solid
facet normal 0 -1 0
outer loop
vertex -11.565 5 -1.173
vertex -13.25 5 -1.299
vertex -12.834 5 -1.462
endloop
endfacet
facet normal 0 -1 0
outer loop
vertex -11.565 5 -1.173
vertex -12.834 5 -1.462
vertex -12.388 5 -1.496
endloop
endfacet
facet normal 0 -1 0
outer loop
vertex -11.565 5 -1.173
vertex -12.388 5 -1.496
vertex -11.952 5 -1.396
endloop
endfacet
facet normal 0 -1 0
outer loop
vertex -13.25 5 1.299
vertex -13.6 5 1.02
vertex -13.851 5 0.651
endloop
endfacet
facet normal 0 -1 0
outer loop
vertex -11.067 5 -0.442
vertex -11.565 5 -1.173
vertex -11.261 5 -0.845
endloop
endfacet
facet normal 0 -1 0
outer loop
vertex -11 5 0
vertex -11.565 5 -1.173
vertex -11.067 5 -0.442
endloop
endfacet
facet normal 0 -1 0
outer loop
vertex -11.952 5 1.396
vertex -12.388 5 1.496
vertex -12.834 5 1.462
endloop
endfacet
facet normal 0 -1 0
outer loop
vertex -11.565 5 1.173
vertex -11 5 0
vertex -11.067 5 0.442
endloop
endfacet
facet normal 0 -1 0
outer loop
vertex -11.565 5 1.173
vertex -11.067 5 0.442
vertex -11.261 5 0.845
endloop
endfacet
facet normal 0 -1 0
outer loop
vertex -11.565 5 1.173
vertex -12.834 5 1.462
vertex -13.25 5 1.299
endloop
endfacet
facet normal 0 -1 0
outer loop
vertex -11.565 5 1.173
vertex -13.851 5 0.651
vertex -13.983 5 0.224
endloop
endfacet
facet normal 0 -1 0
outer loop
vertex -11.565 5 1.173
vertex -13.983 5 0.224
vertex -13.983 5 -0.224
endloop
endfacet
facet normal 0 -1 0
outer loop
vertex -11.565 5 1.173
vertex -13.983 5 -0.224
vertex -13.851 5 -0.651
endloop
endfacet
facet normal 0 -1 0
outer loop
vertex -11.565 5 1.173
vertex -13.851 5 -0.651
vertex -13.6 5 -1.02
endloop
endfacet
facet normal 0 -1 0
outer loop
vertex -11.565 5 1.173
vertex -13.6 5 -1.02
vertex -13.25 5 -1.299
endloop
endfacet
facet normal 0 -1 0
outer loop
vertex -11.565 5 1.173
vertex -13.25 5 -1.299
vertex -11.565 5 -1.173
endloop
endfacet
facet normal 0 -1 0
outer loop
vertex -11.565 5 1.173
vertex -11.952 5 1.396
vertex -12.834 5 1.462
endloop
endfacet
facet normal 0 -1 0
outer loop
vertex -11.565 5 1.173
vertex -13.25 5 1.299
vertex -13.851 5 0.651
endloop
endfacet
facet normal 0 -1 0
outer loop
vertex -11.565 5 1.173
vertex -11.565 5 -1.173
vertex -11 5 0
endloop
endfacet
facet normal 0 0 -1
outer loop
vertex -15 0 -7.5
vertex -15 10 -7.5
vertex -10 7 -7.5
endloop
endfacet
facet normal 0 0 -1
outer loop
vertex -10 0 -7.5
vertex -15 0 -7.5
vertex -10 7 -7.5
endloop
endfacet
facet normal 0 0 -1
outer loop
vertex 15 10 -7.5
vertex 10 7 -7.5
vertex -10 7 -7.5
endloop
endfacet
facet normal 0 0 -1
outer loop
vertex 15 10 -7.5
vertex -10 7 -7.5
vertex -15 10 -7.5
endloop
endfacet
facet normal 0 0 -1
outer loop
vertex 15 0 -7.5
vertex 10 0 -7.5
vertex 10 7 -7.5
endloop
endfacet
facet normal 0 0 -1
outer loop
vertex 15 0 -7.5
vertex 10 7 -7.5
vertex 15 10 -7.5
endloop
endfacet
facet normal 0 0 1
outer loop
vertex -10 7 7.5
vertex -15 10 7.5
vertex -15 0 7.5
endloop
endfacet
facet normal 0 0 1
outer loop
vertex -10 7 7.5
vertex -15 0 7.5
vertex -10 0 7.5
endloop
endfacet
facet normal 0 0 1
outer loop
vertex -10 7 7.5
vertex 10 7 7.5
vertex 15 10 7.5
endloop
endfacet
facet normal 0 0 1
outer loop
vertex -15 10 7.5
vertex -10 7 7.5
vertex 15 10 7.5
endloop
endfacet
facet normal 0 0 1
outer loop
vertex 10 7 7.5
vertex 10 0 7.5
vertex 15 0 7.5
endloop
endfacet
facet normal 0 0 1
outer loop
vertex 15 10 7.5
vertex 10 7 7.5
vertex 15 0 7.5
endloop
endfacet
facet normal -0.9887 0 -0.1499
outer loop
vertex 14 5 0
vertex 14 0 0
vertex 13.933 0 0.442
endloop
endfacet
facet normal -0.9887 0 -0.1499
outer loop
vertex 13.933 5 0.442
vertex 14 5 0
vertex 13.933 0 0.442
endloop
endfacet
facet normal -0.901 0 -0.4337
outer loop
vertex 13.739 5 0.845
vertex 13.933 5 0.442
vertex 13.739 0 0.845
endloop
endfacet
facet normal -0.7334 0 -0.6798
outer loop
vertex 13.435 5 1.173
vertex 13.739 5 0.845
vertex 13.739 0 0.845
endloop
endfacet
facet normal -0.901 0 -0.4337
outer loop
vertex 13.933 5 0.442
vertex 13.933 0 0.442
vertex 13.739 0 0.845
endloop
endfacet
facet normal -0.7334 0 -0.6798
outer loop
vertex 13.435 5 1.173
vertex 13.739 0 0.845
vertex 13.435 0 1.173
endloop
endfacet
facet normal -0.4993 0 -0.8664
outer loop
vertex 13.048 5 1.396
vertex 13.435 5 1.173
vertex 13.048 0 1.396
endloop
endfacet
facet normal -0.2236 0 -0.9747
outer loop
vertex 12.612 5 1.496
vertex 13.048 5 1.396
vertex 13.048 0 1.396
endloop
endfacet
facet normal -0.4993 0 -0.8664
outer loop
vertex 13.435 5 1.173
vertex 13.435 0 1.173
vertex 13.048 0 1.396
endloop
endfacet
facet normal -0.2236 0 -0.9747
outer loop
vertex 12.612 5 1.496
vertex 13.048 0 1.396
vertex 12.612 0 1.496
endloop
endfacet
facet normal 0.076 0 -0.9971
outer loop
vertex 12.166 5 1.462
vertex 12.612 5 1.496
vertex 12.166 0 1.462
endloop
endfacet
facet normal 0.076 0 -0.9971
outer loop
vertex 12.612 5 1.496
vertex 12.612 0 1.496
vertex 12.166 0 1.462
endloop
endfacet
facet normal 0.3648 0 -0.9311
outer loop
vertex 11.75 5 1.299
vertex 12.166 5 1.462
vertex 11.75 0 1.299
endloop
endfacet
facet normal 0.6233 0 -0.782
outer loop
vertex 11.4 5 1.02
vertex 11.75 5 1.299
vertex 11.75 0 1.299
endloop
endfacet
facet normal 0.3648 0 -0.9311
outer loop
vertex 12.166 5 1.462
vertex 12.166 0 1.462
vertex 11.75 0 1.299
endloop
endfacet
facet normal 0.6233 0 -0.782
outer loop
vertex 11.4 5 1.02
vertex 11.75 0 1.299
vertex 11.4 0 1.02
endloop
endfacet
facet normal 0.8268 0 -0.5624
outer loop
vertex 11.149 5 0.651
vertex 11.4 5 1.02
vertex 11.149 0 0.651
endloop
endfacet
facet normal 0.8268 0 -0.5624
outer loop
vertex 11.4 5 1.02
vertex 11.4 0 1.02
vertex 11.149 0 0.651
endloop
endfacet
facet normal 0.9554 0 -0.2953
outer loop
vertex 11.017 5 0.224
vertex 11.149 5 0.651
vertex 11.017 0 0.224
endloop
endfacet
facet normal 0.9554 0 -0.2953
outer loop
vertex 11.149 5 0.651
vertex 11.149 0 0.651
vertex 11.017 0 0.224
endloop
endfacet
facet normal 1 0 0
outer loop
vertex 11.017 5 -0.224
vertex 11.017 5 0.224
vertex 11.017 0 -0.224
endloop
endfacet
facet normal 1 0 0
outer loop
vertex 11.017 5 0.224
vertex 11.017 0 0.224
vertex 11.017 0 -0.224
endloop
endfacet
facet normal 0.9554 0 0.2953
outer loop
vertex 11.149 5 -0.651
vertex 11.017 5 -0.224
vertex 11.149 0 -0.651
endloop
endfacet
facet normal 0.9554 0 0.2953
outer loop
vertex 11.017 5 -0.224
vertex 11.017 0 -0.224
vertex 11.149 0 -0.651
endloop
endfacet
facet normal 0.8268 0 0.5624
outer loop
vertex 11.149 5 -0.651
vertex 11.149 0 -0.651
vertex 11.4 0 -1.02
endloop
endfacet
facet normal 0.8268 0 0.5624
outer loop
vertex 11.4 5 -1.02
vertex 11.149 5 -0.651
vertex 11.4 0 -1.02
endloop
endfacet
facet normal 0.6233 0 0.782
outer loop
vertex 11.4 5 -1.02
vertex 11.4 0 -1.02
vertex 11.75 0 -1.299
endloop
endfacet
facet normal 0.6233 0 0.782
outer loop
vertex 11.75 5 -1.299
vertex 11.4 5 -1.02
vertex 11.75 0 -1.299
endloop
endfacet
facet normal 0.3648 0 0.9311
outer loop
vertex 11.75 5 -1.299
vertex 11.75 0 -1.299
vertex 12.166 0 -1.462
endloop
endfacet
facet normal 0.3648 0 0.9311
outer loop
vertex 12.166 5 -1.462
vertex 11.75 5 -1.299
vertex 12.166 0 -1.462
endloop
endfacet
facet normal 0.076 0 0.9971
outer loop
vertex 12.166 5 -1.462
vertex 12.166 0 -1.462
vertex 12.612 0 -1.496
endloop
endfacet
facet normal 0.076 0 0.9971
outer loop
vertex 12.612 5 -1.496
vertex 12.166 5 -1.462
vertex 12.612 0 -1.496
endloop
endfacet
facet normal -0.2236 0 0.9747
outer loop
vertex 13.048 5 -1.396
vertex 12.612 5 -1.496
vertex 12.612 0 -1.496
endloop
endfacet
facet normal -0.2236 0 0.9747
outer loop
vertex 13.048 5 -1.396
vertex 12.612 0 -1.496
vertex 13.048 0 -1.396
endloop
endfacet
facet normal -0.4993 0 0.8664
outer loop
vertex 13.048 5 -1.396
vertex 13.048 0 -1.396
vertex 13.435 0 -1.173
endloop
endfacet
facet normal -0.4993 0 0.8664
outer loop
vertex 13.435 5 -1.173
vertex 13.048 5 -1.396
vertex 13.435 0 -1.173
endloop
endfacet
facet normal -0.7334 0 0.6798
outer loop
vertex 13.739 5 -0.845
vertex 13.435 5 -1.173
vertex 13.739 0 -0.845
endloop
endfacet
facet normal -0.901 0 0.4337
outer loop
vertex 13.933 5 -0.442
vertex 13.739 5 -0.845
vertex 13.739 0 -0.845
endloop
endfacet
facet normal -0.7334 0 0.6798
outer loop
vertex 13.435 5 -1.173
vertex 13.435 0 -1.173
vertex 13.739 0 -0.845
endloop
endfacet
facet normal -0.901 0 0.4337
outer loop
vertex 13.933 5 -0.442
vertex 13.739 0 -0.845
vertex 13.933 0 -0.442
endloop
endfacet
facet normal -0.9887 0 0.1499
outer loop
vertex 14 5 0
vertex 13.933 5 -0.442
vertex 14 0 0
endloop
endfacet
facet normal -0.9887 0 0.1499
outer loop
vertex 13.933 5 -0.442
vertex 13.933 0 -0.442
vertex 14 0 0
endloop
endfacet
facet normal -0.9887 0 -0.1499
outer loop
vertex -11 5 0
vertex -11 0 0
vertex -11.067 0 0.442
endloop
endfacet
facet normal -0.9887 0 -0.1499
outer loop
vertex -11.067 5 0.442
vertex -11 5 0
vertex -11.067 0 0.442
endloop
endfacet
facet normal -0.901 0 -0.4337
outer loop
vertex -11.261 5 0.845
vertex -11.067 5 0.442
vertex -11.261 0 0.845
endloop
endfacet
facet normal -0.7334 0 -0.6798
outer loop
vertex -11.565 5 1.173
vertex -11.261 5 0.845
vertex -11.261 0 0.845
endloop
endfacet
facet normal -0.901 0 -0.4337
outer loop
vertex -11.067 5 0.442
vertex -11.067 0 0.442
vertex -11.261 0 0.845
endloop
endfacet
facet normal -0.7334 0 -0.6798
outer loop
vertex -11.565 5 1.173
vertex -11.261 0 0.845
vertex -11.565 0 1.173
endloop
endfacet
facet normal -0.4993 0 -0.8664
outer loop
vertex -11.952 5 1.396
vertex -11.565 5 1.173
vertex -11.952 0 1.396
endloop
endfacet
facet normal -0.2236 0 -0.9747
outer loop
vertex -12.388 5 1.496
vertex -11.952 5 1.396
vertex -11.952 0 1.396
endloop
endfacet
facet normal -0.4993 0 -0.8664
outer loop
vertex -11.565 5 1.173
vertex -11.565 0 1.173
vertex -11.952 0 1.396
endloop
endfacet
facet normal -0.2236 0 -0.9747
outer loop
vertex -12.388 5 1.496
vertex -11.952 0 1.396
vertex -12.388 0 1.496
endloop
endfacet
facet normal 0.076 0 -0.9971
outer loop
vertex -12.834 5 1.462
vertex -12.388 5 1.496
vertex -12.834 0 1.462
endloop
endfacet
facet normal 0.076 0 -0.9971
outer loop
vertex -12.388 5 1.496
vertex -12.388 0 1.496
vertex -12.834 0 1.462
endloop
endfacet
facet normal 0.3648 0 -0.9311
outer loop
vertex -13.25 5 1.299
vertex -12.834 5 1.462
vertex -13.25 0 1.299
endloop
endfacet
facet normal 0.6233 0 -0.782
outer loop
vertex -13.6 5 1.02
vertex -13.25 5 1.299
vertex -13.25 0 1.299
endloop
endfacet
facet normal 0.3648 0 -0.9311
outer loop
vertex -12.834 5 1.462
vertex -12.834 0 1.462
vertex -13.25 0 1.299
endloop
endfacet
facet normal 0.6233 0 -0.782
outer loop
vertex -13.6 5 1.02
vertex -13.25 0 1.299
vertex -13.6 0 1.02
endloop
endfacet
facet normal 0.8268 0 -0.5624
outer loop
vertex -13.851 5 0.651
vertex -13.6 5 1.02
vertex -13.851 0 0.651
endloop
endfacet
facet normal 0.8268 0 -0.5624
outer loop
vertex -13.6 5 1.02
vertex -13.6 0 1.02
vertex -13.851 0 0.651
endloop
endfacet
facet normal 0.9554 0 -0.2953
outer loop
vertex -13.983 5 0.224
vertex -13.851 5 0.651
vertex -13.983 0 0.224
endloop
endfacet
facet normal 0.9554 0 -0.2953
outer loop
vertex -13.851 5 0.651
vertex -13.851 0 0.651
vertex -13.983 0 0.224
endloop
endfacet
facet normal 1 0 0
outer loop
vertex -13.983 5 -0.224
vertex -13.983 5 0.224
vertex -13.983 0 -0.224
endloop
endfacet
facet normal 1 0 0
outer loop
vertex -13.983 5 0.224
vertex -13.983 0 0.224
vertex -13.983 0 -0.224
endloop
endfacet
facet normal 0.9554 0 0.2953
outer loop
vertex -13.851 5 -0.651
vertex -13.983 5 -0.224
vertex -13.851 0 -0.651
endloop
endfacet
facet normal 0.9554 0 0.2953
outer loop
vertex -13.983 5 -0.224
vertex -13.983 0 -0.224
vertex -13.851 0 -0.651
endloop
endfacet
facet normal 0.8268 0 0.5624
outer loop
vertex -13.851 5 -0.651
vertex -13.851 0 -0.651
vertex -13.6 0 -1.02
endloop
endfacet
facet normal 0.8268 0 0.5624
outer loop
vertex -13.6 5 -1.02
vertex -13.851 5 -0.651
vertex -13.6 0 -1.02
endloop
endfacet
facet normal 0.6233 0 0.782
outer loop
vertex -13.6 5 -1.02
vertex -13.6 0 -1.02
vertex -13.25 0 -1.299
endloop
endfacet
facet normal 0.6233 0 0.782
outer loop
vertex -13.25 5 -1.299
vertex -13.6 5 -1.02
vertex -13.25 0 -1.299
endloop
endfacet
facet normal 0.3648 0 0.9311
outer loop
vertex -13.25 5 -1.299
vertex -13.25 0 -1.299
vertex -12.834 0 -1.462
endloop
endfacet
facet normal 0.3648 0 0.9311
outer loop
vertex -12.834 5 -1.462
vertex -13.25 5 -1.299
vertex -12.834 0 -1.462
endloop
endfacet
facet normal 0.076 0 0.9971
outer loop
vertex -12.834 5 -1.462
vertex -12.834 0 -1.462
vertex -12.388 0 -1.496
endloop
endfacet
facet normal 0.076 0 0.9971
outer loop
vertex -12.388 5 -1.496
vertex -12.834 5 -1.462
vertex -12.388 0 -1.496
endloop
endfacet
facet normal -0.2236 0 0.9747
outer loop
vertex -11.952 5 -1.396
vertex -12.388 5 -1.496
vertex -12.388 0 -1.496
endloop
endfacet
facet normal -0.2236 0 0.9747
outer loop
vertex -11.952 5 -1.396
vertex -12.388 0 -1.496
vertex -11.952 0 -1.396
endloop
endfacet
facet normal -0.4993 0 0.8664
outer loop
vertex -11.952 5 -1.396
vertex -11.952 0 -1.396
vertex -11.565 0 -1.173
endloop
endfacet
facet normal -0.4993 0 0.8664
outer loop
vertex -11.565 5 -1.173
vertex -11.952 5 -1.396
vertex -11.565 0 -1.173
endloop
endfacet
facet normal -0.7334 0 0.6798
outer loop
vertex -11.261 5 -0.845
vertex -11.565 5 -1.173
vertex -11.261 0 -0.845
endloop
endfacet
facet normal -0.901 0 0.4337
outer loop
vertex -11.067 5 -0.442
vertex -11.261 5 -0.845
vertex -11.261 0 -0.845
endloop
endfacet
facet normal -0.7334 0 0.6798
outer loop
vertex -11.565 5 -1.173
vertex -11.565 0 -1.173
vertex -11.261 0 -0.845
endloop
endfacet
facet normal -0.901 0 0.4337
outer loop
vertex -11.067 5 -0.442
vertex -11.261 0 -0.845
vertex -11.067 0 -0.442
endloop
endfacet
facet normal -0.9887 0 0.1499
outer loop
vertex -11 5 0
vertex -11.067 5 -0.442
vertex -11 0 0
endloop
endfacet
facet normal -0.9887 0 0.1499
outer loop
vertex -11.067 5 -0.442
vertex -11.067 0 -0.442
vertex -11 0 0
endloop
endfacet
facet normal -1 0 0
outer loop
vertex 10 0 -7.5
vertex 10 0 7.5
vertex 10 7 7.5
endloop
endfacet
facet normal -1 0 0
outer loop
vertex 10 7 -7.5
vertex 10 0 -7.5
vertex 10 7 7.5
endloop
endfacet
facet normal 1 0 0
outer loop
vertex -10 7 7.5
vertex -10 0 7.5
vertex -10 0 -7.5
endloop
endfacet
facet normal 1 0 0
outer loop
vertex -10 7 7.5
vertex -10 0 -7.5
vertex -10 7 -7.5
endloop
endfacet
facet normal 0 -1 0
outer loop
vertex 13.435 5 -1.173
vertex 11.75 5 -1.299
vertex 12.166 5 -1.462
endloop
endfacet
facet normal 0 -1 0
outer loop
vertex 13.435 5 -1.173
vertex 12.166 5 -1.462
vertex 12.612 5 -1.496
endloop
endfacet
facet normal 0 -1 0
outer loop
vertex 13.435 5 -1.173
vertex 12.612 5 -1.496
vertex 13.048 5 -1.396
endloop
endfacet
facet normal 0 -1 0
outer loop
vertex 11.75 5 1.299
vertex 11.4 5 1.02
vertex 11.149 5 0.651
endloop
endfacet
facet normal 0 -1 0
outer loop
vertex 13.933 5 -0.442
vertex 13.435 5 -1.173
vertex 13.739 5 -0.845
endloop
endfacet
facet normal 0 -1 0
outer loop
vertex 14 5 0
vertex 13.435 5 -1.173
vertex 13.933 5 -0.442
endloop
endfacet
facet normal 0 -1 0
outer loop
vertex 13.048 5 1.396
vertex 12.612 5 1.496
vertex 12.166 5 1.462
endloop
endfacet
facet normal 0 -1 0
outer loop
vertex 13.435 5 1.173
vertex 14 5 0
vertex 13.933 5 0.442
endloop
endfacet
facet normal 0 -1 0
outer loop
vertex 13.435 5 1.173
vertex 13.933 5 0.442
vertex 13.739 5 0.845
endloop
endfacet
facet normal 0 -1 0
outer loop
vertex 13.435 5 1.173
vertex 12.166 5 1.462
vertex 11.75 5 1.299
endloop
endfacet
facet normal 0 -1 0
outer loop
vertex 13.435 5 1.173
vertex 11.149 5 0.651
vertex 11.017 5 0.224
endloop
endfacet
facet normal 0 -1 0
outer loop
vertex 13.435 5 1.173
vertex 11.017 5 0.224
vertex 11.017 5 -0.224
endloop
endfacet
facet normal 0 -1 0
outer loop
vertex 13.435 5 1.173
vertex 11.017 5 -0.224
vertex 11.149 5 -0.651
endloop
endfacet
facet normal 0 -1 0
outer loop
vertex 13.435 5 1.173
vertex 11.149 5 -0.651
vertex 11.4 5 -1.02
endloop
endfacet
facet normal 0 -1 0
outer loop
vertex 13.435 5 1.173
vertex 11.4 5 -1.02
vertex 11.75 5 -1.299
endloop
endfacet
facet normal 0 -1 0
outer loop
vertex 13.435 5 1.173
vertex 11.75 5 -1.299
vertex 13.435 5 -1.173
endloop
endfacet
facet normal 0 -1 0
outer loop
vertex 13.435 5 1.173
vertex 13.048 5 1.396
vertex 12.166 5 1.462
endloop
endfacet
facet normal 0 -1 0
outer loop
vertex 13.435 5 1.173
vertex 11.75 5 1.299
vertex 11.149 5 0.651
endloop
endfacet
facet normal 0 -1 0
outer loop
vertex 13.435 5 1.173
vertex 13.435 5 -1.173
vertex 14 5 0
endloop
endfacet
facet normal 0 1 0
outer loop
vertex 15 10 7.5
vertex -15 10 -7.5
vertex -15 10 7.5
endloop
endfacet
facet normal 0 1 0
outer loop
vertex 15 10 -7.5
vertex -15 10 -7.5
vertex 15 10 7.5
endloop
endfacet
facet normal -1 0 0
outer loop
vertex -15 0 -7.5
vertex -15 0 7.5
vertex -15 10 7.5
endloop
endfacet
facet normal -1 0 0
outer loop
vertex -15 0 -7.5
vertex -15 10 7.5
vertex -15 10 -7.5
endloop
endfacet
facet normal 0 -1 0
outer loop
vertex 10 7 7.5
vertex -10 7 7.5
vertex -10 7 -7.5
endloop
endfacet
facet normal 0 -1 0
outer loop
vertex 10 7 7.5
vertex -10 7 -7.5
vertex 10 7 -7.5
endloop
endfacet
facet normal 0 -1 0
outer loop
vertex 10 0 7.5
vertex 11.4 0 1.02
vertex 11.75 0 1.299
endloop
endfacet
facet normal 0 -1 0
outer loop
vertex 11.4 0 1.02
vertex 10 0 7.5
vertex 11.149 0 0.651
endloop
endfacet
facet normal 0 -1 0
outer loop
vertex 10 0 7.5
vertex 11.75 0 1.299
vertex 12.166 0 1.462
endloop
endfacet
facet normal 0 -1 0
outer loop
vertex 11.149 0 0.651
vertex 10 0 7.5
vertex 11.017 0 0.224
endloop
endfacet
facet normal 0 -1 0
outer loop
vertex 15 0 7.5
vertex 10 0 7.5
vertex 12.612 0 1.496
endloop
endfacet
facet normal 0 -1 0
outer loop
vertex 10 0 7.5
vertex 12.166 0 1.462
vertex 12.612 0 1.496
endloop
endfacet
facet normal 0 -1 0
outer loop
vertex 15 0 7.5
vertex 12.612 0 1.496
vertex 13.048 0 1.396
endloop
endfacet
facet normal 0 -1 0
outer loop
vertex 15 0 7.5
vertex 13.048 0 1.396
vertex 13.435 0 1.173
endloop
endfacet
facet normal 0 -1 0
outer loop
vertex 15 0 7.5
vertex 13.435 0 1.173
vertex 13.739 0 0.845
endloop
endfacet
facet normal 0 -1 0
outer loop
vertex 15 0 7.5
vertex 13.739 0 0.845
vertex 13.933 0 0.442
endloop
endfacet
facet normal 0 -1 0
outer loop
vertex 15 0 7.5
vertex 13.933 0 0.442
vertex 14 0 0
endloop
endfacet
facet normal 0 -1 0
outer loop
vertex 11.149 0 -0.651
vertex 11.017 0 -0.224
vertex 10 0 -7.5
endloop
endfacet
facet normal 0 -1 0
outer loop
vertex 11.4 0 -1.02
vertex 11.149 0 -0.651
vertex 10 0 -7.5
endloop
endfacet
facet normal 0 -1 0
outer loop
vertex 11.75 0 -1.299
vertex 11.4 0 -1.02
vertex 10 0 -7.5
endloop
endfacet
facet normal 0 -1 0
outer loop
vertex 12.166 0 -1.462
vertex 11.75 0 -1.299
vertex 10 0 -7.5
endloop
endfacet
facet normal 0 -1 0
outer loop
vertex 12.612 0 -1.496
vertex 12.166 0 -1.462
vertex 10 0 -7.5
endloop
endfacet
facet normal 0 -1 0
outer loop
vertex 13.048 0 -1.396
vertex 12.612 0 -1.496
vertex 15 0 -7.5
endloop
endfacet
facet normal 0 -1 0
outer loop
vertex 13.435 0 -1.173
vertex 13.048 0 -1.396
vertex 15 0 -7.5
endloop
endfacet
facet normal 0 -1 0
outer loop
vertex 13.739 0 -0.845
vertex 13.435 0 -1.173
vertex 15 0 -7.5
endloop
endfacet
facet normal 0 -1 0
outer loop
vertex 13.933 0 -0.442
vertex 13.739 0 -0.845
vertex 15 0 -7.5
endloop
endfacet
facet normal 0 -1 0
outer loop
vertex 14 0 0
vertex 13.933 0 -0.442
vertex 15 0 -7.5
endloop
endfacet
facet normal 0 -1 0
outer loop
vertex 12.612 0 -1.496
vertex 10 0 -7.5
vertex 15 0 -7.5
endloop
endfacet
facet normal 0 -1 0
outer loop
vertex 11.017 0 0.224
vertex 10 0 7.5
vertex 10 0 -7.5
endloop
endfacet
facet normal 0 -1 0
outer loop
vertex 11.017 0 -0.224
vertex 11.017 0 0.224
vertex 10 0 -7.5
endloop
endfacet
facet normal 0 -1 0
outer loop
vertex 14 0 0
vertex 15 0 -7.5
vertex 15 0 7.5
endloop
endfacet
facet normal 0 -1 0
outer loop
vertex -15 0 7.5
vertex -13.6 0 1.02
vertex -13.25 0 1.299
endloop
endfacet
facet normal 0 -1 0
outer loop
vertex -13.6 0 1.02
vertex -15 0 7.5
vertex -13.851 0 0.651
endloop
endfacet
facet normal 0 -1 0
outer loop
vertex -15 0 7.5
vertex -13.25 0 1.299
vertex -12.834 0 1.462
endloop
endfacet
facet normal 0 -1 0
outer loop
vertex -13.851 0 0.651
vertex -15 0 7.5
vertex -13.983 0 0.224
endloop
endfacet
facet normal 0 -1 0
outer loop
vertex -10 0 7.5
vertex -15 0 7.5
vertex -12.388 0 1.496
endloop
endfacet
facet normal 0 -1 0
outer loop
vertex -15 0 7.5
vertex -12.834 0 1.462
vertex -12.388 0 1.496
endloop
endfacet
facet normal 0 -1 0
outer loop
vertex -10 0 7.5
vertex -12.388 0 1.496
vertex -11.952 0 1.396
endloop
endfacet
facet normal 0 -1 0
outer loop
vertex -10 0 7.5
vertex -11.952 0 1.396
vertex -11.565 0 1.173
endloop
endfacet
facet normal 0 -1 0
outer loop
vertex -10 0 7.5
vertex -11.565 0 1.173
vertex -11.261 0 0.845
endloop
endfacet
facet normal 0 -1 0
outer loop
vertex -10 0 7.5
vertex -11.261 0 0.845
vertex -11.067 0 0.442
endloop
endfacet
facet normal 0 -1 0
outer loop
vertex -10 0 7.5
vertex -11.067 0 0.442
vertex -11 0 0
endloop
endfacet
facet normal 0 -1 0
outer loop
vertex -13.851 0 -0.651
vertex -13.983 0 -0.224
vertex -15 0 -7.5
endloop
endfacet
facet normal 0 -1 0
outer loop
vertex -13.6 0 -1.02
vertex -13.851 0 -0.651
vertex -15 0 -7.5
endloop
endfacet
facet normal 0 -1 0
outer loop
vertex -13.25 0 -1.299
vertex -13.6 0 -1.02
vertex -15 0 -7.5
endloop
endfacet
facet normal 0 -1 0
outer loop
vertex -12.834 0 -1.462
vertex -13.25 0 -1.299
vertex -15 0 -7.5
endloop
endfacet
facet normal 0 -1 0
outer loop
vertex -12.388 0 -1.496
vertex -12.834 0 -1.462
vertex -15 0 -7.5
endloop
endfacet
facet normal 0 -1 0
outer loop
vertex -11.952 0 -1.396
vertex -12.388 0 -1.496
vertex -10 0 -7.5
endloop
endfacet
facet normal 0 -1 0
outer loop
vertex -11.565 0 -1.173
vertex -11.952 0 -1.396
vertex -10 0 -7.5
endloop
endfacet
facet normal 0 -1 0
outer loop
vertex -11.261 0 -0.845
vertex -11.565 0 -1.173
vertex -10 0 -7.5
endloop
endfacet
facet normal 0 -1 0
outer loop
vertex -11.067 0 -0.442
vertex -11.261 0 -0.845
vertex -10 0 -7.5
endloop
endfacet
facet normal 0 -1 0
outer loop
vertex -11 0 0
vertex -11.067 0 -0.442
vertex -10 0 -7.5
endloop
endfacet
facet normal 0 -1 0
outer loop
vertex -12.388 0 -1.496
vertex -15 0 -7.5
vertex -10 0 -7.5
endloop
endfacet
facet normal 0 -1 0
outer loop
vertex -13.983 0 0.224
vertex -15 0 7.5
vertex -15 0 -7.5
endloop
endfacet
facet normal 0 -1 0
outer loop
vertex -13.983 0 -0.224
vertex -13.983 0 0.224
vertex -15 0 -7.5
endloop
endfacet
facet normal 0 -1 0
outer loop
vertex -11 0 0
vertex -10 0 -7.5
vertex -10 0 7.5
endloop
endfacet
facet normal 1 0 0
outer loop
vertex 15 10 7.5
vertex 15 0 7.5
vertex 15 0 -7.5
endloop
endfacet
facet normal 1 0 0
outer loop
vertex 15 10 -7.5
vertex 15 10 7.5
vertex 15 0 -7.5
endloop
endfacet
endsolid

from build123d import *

# Parameters (mm, degrees)
SKETCH3_W           = 30
SKETCH3_H           = 15
BOSS_EXTRUDE1_DEPTH = 10
SKETCH4_W           = 20
SKETCH4_H           = 7
CUT_EXTRUDE1_DEPTH  = 16
SKETCH5_R           = 1.5
CUT_EXTRUDE2_DEPTH  = 5


with BuildPart() as part:
    # Sketch3 → Boss-Extrude1 (new body)
    with BuildSketch(Plane(origin=(0, 0, 0), x_dir=(1, 0, 0), z_dir=(0, 1, 0))):
        Rectangle(SKETCH3_W, SKETCH3_H)
    extrude(amount=BOSS_EXTRUDE1_DEPTH)

    # Sketch4 → Cut-Extrude1 (cut, through all)
    with BuildSketch(Plane.XY.offset(7.5)):
        with Locations((0, 3.5)):
            Rectangle(SKETCH4_W, SKETCH4_H)
    extrude(amount=-CUT_EXTRUDE1_DEPTH, mode=Mode.SUBTRACT)

    # Sketch5 → Cut-Extrude2 (cut)
    with BuildSketch(Plane.XZ):
        with Locations((12.5, 0)):
            Circle(SKETCH5_R)
        with Locations((-12.5, 0)):
            Circle(SKETCH5_R)
    extrude(amount=-CUT_EXTRUDE2_DEPTH, mode=Mode.SUBTRACT)


solid = part.part
